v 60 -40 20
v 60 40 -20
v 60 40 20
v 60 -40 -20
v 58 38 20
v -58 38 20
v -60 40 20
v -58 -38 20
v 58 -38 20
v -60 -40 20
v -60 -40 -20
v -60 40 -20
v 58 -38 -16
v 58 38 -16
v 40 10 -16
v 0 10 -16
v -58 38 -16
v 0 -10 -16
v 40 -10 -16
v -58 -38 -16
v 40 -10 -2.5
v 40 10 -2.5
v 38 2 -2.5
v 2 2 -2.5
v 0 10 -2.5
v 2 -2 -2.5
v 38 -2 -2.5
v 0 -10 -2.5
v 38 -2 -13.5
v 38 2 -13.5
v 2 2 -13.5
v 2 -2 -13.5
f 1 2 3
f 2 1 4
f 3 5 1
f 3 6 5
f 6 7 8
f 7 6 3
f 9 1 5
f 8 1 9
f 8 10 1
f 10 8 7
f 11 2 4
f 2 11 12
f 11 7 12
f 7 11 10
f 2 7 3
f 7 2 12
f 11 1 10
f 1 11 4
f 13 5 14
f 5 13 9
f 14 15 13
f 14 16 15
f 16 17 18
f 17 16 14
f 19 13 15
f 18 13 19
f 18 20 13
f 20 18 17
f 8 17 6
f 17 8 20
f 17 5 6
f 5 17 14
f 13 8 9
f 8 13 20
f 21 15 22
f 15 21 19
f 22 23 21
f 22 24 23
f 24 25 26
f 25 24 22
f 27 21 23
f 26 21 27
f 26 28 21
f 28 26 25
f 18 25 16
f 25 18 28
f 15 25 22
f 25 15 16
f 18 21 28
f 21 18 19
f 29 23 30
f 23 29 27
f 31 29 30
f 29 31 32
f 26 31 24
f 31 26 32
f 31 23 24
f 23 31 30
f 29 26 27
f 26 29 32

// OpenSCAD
// СпектрБио-2 — Анализатор биомаркеров
$fn = 64;
module main_body() {
    difference() {
        cube([120,80,40], center=true);
        translate([0,0,2]) cube([116,76,36], center=true);
    }
}
module kuvette() {
    color([0.8,0.8,0.8])
    difference() {
        cube([40,20,15], center=true);
        translate([0,0,2]) cube([36,4,11], center=true);
    }
}
module assembly() {
    main_body();
    translate([20,0,-10]) kuvette();
}
assembly();
